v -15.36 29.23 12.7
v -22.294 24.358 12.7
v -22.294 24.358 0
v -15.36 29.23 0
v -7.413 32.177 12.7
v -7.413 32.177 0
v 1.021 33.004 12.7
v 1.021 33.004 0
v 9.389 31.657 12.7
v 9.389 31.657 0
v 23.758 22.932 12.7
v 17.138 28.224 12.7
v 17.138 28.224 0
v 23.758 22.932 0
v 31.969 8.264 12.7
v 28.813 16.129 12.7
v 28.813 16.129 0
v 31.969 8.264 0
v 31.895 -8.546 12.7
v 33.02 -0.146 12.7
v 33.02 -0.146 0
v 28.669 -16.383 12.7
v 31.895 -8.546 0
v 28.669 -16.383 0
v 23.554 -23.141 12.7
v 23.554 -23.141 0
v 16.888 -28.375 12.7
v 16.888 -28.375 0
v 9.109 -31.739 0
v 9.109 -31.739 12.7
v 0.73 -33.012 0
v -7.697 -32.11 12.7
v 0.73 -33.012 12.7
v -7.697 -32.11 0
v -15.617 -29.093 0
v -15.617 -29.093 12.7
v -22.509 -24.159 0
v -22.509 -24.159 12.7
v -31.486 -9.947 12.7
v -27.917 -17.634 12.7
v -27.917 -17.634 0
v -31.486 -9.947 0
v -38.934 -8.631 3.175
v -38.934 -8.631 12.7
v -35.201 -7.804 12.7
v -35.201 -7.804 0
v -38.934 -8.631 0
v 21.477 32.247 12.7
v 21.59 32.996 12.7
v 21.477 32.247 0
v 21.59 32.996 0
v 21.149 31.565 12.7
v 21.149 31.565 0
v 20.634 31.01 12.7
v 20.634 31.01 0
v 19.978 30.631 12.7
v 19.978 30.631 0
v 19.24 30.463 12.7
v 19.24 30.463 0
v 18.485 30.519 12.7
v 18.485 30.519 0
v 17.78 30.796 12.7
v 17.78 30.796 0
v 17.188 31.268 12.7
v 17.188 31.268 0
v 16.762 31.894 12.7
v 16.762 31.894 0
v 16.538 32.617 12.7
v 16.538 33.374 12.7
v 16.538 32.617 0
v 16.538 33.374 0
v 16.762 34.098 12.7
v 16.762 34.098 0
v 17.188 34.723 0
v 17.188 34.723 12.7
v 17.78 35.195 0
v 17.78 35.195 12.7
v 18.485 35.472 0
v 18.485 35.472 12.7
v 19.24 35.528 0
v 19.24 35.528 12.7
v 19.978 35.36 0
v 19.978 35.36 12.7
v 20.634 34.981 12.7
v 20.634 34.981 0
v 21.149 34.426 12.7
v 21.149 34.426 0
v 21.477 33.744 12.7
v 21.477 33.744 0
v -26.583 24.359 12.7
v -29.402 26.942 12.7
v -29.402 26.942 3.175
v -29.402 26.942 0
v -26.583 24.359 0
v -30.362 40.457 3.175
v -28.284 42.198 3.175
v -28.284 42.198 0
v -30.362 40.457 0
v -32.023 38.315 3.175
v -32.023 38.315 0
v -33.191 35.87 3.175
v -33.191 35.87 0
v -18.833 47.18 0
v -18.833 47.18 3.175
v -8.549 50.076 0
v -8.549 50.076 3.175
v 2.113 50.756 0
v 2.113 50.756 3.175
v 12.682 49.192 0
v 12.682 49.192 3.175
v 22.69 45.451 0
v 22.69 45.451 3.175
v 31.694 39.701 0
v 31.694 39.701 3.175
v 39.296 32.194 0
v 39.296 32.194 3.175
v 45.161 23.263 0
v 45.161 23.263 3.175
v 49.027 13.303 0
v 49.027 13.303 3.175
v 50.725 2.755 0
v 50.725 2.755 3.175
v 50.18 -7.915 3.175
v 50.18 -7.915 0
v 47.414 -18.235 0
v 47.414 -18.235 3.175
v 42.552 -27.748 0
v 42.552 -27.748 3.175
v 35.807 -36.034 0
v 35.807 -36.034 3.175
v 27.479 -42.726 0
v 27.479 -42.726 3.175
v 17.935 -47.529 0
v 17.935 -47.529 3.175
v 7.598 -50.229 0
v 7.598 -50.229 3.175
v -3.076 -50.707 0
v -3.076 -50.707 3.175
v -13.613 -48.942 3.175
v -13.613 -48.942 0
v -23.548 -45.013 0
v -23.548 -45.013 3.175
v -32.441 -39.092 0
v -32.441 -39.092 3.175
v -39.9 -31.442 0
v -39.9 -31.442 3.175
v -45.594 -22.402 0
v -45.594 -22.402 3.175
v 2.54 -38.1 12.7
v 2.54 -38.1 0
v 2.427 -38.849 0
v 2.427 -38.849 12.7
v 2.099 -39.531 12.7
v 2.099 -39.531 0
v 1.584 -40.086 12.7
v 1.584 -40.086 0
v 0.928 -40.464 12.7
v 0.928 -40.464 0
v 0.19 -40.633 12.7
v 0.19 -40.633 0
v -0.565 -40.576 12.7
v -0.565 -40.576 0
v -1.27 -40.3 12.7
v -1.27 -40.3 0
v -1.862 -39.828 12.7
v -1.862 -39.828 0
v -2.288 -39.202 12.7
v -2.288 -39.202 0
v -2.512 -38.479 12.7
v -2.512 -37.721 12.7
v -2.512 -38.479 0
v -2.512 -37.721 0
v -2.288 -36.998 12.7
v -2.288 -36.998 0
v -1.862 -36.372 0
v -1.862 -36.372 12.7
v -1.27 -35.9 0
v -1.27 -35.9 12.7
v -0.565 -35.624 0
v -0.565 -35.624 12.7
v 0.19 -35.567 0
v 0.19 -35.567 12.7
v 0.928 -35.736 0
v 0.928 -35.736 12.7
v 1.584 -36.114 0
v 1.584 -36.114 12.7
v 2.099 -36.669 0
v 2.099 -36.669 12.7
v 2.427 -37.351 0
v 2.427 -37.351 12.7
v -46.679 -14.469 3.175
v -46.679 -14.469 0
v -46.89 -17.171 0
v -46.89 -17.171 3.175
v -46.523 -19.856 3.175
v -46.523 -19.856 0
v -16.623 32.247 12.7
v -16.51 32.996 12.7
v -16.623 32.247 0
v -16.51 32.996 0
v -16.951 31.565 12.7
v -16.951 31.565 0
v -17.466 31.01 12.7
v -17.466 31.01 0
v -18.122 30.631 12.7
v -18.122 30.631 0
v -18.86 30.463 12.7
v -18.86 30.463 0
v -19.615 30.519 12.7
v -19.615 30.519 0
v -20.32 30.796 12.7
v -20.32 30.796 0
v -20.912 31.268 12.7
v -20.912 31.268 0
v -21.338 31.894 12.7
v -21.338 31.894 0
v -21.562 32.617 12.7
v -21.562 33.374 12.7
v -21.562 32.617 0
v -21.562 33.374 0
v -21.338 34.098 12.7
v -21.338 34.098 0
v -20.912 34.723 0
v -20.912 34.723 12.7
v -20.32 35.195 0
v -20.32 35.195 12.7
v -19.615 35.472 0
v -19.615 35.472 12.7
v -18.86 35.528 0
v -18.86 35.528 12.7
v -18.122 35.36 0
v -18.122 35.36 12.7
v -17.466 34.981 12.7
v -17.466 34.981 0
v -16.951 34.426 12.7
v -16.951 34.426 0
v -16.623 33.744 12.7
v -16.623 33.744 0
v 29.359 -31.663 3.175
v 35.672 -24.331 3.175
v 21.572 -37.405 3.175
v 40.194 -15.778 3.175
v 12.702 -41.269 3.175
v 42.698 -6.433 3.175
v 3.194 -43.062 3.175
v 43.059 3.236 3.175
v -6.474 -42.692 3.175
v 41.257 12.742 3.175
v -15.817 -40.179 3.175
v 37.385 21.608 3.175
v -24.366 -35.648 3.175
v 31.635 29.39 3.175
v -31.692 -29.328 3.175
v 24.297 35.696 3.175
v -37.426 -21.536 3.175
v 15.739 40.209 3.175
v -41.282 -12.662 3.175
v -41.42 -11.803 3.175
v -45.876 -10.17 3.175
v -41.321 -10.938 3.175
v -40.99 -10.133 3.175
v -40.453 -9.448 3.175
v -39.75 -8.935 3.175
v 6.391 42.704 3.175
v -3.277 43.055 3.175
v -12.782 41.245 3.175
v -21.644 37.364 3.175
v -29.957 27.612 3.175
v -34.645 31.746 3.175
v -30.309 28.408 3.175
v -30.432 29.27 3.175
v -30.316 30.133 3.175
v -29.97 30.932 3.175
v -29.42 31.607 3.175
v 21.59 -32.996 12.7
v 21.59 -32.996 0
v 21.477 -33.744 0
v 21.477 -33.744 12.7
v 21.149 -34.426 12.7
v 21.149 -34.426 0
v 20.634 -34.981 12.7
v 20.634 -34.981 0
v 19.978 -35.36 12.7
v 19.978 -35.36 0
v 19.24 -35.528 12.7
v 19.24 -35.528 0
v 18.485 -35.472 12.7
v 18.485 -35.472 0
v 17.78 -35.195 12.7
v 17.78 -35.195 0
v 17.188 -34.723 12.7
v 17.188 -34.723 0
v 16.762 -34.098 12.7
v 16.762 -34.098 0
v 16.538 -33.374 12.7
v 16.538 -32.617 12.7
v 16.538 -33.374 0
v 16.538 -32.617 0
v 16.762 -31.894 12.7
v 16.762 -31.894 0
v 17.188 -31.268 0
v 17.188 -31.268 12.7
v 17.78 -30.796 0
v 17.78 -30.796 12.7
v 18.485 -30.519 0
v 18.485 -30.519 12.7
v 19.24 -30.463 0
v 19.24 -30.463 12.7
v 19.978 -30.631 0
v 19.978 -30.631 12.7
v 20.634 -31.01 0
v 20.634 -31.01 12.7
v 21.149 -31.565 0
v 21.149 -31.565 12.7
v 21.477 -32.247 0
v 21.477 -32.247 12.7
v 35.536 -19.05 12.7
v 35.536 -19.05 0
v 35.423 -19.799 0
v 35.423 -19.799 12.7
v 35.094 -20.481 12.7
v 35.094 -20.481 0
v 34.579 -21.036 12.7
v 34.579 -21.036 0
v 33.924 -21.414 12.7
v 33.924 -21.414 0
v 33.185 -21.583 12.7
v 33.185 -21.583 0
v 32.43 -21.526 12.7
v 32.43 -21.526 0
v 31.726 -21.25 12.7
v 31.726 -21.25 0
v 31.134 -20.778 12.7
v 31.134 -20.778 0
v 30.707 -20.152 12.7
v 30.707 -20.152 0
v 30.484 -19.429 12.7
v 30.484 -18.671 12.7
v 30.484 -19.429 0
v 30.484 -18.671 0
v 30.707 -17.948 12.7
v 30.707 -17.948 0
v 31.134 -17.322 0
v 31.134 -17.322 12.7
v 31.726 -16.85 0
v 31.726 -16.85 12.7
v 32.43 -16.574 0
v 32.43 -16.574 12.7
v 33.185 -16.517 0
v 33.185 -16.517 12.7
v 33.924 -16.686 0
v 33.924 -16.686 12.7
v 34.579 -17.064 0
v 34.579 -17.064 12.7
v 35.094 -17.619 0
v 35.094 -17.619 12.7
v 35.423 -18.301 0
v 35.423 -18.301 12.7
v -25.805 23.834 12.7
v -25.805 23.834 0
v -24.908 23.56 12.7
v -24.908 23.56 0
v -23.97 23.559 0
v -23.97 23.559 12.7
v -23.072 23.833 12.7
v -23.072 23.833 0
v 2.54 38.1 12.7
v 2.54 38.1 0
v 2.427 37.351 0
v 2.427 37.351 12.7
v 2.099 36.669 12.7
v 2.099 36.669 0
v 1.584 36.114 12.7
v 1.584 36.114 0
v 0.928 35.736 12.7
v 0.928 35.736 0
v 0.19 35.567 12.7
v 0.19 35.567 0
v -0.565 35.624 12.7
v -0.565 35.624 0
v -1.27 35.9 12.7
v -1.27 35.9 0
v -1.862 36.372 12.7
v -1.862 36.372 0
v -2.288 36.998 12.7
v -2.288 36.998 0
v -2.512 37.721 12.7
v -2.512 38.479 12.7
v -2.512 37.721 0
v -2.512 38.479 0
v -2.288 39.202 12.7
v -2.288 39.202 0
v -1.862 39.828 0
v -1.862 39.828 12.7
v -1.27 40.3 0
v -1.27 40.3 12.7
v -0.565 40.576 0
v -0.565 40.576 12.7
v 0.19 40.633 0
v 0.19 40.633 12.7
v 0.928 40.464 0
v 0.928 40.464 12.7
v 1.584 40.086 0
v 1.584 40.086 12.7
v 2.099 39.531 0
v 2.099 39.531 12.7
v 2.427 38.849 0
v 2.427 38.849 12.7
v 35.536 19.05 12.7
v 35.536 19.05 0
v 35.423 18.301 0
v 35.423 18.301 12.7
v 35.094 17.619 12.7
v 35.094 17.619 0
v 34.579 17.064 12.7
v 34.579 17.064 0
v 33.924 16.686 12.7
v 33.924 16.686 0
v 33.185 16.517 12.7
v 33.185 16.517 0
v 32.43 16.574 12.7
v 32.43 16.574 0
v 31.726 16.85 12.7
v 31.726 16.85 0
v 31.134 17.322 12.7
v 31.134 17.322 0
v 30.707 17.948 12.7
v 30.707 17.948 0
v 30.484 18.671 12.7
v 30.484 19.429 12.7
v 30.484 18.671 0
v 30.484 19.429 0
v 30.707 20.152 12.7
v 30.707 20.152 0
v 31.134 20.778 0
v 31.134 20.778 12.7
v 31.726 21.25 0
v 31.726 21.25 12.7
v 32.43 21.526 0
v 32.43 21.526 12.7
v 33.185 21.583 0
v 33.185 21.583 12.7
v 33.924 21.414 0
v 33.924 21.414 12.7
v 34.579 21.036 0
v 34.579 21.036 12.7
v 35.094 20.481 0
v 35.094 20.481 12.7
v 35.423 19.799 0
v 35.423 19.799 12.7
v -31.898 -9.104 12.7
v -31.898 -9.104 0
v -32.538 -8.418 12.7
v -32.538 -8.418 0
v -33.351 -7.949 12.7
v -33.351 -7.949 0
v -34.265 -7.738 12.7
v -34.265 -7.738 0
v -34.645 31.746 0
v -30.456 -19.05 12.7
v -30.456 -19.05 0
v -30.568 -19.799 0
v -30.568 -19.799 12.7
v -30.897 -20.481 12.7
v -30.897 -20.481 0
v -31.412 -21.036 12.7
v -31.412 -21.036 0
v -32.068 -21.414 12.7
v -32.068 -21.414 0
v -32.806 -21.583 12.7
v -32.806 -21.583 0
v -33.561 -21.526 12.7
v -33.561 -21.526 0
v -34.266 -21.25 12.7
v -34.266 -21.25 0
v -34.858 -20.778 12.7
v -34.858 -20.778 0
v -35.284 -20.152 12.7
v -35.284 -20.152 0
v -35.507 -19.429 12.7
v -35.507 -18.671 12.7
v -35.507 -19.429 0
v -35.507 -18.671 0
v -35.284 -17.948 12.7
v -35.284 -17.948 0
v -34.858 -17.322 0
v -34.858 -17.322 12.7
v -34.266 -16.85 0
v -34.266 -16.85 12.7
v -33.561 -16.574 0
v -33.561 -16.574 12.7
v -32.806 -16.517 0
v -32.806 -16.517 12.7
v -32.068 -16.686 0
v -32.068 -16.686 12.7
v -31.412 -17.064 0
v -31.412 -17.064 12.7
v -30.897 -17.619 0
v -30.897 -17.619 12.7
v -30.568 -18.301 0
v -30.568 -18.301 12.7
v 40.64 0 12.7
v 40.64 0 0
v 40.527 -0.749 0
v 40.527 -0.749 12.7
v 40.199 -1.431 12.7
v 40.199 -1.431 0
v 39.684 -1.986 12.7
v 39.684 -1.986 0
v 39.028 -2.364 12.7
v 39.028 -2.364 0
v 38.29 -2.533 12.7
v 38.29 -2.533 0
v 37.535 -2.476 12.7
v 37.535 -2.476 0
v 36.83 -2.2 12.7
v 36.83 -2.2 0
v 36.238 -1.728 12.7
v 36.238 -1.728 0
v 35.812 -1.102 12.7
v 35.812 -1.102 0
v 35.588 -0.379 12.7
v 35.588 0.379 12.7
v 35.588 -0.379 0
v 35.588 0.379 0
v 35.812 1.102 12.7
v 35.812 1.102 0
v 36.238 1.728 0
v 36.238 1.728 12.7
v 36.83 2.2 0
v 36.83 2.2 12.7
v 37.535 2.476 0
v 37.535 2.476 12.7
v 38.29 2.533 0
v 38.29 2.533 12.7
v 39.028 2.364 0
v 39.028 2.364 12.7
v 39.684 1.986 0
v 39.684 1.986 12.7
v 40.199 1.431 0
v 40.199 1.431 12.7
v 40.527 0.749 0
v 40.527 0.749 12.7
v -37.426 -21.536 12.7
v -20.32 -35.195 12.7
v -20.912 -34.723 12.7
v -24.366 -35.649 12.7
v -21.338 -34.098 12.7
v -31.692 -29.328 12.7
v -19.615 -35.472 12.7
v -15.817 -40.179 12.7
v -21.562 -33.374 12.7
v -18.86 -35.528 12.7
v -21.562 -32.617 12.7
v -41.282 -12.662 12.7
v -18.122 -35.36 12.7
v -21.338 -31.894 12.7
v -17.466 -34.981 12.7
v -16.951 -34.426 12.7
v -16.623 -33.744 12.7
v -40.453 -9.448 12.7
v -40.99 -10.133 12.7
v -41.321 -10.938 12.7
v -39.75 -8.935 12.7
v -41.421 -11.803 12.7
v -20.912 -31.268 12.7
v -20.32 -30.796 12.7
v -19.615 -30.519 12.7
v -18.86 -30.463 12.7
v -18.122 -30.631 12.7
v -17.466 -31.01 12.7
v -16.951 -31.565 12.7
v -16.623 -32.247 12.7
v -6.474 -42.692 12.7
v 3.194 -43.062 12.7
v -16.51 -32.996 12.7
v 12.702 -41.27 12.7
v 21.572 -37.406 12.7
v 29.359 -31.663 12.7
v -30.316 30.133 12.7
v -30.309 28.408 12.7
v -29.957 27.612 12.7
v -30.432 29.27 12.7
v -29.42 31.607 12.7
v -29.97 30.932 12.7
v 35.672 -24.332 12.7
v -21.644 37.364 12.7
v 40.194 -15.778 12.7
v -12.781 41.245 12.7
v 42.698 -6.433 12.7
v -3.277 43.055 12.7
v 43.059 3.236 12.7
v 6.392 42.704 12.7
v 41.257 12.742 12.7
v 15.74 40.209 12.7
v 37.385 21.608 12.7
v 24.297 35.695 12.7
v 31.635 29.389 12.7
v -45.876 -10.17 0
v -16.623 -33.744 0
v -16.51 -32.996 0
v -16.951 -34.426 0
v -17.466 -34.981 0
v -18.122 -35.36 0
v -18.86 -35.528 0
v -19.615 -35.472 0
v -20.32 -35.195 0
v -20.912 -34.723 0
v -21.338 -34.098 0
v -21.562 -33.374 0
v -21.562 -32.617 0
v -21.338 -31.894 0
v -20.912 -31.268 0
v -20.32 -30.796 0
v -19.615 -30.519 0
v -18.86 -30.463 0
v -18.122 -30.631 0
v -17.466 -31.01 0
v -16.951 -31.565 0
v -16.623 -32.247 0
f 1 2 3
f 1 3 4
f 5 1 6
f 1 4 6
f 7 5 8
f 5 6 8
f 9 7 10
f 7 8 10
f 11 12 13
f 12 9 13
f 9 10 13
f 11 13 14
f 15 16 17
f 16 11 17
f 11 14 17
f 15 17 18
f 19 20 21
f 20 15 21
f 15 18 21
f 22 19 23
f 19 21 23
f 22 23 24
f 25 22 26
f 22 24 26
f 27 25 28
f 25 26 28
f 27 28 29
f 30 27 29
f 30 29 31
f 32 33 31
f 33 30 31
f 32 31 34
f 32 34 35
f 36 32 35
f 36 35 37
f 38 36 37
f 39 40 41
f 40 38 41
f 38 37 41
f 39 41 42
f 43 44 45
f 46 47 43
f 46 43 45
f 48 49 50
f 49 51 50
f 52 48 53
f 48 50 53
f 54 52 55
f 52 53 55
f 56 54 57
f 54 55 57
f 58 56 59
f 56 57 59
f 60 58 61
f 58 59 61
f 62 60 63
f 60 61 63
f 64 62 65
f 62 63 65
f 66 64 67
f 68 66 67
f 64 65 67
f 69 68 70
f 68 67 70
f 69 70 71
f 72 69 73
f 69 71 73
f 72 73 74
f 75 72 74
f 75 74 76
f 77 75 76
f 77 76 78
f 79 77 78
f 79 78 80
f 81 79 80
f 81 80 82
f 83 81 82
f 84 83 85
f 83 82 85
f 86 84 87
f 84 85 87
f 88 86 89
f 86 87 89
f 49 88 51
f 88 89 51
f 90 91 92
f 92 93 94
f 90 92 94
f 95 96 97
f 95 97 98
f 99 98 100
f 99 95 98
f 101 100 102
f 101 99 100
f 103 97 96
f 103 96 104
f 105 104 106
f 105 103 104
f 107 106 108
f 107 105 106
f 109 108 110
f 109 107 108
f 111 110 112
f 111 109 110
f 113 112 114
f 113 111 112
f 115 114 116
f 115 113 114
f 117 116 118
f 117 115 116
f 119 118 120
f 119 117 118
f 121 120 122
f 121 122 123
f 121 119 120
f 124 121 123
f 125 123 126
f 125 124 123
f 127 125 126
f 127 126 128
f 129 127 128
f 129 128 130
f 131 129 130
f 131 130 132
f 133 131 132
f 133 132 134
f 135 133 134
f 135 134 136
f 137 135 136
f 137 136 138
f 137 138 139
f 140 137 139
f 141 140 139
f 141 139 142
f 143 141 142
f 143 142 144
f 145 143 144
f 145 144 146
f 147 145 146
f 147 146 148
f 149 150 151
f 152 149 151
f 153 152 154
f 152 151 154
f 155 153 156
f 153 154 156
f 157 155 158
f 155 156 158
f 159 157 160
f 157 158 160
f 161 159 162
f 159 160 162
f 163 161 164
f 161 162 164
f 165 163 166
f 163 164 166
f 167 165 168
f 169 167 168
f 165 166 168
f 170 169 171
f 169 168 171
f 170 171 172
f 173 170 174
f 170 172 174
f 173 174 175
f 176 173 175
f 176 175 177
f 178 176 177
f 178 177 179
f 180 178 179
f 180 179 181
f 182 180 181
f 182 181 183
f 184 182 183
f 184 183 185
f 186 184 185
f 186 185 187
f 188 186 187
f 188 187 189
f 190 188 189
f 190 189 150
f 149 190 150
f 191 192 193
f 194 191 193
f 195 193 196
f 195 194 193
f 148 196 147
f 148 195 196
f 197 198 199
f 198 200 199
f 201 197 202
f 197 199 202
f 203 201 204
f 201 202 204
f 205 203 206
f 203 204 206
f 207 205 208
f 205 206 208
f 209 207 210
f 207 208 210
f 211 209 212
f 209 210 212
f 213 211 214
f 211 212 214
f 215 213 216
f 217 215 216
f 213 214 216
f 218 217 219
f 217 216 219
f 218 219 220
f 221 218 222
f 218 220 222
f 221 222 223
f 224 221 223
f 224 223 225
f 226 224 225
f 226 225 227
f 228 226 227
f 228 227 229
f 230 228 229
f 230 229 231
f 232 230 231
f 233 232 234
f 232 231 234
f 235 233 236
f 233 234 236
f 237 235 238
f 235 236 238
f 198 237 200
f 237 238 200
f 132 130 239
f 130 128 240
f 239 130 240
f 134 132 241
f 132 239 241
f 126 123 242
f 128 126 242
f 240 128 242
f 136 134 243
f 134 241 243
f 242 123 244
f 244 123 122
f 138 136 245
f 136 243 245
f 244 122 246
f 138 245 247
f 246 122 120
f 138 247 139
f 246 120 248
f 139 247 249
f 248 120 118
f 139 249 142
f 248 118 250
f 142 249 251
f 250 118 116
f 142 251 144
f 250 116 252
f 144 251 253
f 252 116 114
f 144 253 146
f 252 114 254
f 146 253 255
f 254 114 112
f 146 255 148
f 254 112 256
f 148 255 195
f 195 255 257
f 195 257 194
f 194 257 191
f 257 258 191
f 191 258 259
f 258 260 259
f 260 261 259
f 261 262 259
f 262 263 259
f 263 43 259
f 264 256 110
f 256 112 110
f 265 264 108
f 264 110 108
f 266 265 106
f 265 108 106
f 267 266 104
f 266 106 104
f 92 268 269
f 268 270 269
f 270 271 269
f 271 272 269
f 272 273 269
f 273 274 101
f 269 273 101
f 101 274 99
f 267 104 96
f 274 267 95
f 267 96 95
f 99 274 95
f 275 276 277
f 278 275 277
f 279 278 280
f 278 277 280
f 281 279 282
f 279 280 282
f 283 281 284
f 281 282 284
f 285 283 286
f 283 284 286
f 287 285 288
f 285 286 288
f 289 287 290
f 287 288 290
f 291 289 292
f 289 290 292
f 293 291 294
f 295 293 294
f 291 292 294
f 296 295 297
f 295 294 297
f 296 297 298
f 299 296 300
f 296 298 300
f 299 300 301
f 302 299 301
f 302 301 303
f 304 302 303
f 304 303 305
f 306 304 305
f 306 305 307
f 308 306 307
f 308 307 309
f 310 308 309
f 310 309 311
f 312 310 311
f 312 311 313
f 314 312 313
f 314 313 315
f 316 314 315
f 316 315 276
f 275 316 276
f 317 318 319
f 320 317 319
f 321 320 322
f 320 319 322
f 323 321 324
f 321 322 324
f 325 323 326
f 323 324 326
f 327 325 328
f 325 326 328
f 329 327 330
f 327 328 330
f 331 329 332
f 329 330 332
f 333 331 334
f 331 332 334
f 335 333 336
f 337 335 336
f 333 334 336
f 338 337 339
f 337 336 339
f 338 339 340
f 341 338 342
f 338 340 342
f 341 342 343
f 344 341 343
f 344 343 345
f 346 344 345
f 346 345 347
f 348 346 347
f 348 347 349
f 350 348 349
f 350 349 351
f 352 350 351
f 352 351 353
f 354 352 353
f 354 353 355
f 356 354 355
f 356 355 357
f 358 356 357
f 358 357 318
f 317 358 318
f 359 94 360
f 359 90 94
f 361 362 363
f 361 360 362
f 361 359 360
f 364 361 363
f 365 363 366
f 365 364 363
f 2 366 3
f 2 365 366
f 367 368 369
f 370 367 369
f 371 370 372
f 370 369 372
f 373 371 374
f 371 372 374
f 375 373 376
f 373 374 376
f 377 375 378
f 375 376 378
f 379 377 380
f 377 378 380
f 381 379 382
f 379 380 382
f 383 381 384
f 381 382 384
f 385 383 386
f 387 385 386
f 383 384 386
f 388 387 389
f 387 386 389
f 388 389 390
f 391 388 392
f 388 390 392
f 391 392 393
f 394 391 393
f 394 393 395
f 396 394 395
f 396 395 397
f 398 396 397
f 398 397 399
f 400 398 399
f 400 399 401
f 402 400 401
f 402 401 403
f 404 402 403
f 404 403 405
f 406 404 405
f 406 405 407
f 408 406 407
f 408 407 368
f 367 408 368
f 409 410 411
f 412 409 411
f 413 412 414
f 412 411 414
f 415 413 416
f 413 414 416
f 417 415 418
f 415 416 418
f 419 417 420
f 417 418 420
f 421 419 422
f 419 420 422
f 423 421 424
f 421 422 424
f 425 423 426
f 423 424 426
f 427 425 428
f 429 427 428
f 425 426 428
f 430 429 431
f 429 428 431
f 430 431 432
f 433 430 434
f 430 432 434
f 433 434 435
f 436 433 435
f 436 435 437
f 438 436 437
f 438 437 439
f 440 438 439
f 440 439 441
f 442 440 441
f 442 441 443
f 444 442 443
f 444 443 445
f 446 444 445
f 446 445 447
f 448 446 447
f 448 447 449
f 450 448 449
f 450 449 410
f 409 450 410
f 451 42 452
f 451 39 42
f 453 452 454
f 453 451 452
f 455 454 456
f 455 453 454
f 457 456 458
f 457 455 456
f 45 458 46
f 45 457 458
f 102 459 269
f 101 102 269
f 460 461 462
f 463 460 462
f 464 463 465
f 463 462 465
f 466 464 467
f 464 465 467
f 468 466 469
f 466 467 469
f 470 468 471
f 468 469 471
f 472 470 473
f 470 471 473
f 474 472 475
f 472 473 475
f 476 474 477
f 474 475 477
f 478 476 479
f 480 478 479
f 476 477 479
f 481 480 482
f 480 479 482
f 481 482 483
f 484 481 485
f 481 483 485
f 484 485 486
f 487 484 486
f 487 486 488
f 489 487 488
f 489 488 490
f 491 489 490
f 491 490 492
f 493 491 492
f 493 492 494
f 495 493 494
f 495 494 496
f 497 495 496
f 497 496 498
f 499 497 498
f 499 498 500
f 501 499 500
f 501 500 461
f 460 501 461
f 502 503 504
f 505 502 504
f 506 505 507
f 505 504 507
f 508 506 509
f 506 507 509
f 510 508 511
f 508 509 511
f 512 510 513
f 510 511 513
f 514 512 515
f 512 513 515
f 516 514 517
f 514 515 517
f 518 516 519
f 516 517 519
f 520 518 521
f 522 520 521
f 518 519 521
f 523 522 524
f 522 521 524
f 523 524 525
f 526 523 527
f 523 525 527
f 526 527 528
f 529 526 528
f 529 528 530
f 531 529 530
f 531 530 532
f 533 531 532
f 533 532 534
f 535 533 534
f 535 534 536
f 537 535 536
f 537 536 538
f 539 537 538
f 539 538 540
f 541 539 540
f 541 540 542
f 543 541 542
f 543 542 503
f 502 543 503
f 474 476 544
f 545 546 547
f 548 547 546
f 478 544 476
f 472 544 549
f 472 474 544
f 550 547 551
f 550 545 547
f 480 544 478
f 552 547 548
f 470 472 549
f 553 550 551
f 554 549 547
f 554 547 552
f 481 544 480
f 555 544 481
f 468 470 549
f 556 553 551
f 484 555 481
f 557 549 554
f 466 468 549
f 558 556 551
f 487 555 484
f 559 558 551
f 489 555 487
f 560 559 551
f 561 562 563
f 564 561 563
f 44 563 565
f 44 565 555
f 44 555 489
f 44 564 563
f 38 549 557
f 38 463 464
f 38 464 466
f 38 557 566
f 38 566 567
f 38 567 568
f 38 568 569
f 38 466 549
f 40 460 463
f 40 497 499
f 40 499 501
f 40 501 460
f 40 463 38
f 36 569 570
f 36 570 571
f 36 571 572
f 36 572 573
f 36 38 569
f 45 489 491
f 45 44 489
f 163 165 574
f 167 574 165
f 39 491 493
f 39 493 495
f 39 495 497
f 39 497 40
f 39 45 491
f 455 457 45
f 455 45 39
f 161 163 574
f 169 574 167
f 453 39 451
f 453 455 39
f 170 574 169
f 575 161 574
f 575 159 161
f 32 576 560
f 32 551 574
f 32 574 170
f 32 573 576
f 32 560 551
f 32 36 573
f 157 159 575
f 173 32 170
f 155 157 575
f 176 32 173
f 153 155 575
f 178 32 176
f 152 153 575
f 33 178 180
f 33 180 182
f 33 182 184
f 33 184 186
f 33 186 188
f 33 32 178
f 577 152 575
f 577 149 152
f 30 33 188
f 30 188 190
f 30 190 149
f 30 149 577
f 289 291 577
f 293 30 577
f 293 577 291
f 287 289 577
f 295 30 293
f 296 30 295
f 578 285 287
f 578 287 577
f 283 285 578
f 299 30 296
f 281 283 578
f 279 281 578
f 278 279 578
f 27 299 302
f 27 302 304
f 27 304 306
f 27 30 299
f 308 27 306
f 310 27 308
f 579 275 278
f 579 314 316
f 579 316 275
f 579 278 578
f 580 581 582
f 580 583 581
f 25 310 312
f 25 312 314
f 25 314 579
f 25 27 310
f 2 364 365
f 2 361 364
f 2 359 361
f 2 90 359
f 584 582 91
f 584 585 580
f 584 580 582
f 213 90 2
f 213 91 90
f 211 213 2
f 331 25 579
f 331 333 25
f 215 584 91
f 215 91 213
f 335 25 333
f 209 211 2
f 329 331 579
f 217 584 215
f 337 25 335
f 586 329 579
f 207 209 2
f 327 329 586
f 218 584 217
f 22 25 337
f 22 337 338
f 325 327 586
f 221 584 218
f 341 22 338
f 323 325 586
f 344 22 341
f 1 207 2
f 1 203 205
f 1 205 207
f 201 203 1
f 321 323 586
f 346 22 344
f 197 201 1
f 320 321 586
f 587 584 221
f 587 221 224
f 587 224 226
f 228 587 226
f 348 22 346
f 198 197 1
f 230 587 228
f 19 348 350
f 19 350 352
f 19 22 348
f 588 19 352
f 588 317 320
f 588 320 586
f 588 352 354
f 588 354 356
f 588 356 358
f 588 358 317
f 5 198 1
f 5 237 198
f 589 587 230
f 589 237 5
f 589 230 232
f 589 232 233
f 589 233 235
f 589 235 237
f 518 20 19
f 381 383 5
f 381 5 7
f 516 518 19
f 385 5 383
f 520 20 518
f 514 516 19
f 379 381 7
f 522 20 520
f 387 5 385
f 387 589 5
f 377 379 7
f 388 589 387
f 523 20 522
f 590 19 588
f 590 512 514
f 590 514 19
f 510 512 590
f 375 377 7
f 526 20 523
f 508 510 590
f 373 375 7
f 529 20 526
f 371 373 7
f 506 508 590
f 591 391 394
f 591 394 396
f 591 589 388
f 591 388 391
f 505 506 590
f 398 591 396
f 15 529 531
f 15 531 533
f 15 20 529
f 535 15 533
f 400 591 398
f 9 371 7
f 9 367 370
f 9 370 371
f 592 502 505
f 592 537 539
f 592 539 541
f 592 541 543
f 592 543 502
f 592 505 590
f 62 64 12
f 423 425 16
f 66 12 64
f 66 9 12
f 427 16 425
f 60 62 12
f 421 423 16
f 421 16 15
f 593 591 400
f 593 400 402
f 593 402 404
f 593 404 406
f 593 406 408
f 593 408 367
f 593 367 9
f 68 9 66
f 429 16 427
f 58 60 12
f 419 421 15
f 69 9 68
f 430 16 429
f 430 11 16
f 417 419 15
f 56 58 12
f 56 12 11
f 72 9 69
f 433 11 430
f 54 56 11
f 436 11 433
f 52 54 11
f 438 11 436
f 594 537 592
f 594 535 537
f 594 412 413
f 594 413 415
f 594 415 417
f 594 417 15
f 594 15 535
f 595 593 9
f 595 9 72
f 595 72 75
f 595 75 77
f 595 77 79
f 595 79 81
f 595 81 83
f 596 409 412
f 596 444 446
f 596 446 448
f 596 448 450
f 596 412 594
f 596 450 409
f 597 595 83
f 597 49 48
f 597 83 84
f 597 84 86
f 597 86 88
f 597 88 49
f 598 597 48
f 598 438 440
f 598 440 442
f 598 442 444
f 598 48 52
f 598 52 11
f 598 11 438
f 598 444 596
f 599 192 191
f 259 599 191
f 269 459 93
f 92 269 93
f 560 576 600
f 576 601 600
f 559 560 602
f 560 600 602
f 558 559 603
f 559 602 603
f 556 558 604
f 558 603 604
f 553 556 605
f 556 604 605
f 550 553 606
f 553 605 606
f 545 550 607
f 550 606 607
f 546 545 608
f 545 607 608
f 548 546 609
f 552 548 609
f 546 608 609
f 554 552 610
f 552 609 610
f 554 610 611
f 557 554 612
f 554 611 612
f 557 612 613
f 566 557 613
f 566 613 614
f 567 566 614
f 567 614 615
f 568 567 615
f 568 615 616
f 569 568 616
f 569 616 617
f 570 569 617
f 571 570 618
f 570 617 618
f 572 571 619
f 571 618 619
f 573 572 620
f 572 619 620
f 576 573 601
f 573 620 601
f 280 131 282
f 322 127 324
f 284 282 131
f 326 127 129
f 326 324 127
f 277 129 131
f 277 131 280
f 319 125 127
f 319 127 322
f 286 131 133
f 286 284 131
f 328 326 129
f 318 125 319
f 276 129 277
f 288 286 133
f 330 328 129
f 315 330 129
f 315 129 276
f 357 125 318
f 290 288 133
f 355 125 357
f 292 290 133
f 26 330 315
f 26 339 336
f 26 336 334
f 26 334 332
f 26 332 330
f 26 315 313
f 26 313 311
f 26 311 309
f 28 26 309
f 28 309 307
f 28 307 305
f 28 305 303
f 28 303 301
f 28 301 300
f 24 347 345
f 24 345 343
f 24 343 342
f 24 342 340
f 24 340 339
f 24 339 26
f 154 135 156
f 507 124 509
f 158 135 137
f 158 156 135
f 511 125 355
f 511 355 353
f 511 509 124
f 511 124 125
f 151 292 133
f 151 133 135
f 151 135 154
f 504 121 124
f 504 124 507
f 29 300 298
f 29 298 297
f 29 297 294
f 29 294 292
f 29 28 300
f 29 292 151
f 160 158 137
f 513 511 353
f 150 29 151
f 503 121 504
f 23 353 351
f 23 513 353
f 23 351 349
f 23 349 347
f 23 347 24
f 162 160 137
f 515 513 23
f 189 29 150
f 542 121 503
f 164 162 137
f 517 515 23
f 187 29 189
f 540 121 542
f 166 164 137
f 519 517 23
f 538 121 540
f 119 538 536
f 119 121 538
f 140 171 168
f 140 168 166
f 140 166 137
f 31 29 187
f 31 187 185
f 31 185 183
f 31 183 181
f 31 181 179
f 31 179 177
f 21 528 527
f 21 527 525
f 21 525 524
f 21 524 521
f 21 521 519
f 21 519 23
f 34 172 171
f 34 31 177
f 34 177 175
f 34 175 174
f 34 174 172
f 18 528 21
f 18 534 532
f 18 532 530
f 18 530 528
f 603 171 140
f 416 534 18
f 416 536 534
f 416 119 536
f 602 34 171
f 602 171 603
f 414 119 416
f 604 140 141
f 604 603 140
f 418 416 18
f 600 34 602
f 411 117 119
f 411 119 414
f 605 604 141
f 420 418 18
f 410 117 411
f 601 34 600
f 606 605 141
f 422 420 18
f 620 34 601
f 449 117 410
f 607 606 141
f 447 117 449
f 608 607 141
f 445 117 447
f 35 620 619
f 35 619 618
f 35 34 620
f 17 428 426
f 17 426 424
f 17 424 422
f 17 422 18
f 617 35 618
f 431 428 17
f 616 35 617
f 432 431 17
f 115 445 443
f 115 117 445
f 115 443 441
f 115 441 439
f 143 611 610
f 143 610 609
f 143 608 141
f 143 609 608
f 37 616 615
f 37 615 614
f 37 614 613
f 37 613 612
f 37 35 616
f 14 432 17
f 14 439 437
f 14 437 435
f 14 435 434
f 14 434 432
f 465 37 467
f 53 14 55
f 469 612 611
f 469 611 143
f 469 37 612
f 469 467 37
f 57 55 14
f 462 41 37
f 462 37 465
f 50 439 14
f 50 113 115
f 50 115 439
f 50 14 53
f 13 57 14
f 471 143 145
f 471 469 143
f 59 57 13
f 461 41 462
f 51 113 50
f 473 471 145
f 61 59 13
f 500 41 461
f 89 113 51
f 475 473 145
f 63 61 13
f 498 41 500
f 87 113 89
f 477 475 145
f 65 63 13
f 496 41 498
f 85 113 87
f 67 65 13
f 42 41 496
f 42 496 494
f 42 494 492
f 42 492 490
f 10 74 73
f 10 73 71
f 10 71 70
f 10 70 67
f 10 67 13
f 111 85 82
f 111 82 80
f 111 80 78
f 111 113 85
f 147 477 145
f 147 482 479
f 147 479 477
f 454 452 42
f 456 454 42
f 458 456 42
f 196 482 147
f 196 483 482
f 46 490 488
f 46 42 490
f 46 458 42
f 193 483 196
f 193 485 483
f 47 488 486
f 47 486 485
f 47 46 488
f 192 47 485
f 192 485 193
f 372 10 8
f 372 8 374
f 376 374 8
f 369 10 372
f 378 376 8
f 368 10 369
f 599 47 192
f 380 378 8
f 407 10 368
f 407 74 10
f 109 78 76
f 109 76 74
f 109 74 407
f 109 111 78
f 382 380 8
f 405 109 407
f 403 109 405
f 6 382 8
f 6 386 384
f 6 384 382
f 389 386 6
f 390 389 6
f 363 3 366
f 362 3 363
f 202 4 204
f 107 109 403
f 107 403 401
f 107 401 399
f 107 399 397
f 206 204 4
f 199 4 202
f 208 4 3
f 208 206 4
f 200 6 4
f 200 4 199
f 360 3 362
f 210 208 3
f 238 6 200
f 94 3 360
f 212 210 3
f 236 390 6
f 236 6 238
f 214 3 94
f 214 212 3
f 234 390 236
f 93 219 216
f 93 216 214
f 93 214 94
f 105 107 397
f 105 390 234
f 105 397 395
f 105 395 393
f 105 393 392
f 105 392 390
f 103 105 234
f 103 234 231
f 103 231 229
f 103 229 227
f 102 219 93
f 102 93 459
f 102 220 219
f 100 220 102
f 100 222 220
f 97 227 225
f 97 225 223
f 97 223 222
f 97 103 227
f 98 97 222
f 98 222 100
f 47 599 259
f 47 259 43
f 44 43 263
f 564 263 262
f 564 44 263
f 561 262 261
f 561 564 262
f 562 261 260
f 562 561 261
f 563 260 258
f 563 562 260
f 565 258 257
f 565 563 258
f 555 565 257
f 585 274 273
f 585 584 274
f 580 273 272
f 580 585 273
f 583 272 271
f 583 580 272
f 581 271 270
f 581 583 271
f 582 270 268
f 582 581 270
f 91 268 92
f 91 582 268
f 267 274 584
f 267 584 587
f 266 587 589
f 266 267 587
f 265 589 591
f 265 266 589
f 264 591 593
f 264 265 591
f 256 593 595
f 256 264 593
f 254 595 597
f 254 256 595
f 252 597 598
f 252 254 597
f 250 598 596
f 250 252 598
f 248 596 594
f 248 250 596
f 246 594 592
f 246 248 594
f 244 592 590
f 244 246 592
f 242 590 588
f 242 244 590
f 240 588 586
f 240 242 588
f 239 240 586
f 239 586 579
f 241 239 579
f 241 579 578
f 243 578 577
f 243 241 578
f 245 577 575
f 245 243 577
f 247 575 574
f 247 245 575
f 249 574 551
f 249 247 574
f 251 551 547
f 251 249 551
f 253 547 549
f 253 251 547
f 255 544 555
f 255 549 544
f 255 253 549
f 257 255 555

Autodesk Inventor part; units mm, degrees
ref_plane "YZ Plane" through (0, 0, 0) normal (1, 0, 0) x (0, 1, 0)
ref_plane "XZ Plane" through (0, 0, 0) normal (0, 1, 0) x (-1, 0, 0)
ref_plane "XY Plane" through (0, 0, 0) normal (0, 0, 1) x (1, 0, 0)
sketch "Sketch1" plane through (0, 0, 0) normal (0, 0, 1) x (1, 0, 0)
  circle A0 centre (0, 38.1) radius 2.54
  circle A1 centre (-19.05, 32.9956) radius 2.54
  circle A2 centre (-32.9956, 19.05) radius 2.54
  circle A3 centre (-38.1, 0) radius 2.54
  arc A4 (-34.7393, -15.6458) -> (-25.6134, 28.2057) centre (0, 0) ccw
  line L0 (0, 0) -> (-22.4665, 0)
  arc A5 (-42.1565, -9.3459) -> (-31.8356, 29.172) centre (0, 0) ccw
  arc A6 (-32.2373, -7.1468) -> (-24.3449, 22.308) centre (0, 0) ccw
  line L1 (-31.8356, 29.172) -> (-24.3449, 22.308)
  line L2 (-42.1565, -9.3459) -> (-32.2373, -7.1468)
  circle A7 centre (-32.9956, -19.05) radius 2.54
  circle A8 centre (-19.05, -32.9956) radius 2.54
  circle A9 centre (0, -38.1) radius 2.54
  circle A10 centre (19.05, -32.9956) radius 2.54
  circle A11 centre (32.9956, -19.05) radius 2.54
  circle A12 centre (38.1, 0) radius 2.54
  circle A13 centre (32.9956, 19.05) radius 2.54
  circle A14 centre (19.05, 32.9956) radius 2.54
  dimension "d0" = 38.1
  dimension "d3" = 360
  dimension "d5" = 5.08
  dimension "d6" = 5.08
  dimension "d7" = 5.08
  dimension "d8" = 55
  dimension "d9" = 42.5
extrude "Extrusion1" add sketch "Sketch1" along normal blind 12.7 contours L2 A6 L1 A5
fillet "Fillet2" radius 3.175 4 edges at (-31.8356, 29.172, 6.35) (-24.3449, 22.308, 6.35) (-32.2373, -7.1468, 6.35) (-42.1565, -9.3459, 6.35)
sketch "Sketch2" plane through (0, 0, 0) normal (0, 0, -1) x (-1, 0, 0)
  arc A0 (29.42, 31.6066) -> (41.2817, -12.6621) centre (0, 0) ccw projected
  arc A1 (37.4537, 34.32) -> (49.5958, -10.9951) centre (0, 0) ccw
  line L0 (37.4537, 34.32) -> (29.4017, 26.9417)
  line L1 (29.4017, 26.9417) -> (26.5829, 24.3587) projected
  arc A2 (29.4017, 26.9417) -> (29.42, 31.6066) centre (27.2567, 29.2826) ccw projected
  line L2 (35.2008, -7.8038) -> (38.9335, -8.6314) projected
  arc A3 (41.2817, -12.6621) -> (38.9335, -8.6314) centre (38.2463, -11.7311) ccw projected
  line L3 (49.5958, -10.9951) -> (38.9335, -8.6314)
  dimension "d20" = 50.8
extrude "Extrusion2" add sketch "Sketch2" against normal blind 3.175
chamfer "Chamfer3" distance 7.62 distance2 3.81 1 edges at (-37.4537, 34.32, 1.5875) measured on face at (-32.5487, -39.0029, 2.1167)
chamfer "Chamfer4" distance 3.81 distance2 7.62 1 edges at (-49.5958, -10.9951, 1.5875) measured on face at (-36.4451, -8.0797, 5.2917)
fillet "Fillet3" radius 12.7 2 edges at (-47.3933, -18.2899, 1.5875) (-31.8988, 39.5361, 1.5875)
equation "\"d7\" = d6"
properties part number "RotateLimitPlate"
